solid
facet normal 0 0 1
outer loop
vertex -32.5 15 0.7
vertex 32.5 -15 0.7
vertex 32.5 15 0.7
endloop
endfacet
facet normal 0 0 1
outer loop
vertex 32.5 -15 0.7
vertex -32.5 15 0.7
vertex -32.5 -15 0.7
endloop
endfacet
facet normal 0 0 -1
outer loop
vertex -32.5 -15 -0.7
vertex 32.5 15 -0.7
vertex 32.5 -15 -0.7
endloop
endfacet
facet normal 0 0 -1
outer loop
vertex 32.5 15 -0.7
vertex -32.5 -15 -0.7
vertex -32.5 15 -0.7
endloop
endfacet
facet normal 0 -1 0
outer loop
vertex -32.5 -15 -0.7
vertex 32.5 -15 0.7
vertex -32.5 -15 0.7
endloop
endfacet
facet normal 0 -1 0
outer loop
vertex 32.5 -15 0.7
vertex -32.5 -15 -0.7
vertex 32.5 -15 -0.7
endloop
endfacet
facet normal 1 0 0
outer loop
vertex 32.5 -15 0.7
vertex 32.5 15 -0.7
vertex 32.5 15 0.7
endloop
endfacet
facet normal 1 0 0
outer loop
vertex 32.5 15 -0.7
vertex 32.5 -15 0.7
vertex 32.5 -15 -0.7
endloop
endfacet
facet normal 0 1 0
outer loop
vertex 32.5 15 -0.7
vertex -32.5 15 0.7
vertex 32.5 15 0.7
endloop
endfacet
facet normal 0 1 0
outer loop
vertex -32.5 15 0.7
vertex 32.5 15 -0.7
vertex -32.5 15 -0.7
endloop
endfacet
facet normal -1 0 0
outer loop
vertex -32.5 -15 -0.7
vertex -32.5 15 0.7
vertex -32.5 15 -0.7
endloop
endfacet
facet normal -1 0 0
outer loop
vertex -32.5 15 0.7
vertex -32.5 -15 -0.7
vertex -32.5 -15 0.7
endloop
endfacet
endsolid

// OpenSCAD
// Parameters
pcb_length = 65; //[32.5:130:0.5]
pcb_width = 30; //[15:60:0.5]
pcb_thickness = 1.4; //[0.7:2.8:0.1]
corner_radius = 0; //[0:5:0.1]
chamfer_size = 0; //[0:2:0.1]

// Main PCB Body
module pcb_main_body() {
  color([0.0, 0.4, 0.2]) // Green color for PCB
  cube([pcb_length, pcb_width, pcb_thickness], center=true);
}

// Placeholder for additional components
module mounting_holes() {
  // No geometry defined
}

module edge_connectors() {
  // No geometry defined
}

module ic_packages() {
  // No geometry defined
}

module silkscreen_markings() {
  // No geometry defined
}

module rounded_corners() {
  // No geometry defined
}

module chamfers() {
  // No geometry defined
}

// Complete SBC Model
module sbc_complete_model() {
  union() {
    pcb_main_body();
    mounting_holes();
    edge_connectors();
    ic_packages();
    silkscreen_markings();
    rounded_corners();
    chamfers();
  }
}

// Render the final model
sbc_complete_model();
